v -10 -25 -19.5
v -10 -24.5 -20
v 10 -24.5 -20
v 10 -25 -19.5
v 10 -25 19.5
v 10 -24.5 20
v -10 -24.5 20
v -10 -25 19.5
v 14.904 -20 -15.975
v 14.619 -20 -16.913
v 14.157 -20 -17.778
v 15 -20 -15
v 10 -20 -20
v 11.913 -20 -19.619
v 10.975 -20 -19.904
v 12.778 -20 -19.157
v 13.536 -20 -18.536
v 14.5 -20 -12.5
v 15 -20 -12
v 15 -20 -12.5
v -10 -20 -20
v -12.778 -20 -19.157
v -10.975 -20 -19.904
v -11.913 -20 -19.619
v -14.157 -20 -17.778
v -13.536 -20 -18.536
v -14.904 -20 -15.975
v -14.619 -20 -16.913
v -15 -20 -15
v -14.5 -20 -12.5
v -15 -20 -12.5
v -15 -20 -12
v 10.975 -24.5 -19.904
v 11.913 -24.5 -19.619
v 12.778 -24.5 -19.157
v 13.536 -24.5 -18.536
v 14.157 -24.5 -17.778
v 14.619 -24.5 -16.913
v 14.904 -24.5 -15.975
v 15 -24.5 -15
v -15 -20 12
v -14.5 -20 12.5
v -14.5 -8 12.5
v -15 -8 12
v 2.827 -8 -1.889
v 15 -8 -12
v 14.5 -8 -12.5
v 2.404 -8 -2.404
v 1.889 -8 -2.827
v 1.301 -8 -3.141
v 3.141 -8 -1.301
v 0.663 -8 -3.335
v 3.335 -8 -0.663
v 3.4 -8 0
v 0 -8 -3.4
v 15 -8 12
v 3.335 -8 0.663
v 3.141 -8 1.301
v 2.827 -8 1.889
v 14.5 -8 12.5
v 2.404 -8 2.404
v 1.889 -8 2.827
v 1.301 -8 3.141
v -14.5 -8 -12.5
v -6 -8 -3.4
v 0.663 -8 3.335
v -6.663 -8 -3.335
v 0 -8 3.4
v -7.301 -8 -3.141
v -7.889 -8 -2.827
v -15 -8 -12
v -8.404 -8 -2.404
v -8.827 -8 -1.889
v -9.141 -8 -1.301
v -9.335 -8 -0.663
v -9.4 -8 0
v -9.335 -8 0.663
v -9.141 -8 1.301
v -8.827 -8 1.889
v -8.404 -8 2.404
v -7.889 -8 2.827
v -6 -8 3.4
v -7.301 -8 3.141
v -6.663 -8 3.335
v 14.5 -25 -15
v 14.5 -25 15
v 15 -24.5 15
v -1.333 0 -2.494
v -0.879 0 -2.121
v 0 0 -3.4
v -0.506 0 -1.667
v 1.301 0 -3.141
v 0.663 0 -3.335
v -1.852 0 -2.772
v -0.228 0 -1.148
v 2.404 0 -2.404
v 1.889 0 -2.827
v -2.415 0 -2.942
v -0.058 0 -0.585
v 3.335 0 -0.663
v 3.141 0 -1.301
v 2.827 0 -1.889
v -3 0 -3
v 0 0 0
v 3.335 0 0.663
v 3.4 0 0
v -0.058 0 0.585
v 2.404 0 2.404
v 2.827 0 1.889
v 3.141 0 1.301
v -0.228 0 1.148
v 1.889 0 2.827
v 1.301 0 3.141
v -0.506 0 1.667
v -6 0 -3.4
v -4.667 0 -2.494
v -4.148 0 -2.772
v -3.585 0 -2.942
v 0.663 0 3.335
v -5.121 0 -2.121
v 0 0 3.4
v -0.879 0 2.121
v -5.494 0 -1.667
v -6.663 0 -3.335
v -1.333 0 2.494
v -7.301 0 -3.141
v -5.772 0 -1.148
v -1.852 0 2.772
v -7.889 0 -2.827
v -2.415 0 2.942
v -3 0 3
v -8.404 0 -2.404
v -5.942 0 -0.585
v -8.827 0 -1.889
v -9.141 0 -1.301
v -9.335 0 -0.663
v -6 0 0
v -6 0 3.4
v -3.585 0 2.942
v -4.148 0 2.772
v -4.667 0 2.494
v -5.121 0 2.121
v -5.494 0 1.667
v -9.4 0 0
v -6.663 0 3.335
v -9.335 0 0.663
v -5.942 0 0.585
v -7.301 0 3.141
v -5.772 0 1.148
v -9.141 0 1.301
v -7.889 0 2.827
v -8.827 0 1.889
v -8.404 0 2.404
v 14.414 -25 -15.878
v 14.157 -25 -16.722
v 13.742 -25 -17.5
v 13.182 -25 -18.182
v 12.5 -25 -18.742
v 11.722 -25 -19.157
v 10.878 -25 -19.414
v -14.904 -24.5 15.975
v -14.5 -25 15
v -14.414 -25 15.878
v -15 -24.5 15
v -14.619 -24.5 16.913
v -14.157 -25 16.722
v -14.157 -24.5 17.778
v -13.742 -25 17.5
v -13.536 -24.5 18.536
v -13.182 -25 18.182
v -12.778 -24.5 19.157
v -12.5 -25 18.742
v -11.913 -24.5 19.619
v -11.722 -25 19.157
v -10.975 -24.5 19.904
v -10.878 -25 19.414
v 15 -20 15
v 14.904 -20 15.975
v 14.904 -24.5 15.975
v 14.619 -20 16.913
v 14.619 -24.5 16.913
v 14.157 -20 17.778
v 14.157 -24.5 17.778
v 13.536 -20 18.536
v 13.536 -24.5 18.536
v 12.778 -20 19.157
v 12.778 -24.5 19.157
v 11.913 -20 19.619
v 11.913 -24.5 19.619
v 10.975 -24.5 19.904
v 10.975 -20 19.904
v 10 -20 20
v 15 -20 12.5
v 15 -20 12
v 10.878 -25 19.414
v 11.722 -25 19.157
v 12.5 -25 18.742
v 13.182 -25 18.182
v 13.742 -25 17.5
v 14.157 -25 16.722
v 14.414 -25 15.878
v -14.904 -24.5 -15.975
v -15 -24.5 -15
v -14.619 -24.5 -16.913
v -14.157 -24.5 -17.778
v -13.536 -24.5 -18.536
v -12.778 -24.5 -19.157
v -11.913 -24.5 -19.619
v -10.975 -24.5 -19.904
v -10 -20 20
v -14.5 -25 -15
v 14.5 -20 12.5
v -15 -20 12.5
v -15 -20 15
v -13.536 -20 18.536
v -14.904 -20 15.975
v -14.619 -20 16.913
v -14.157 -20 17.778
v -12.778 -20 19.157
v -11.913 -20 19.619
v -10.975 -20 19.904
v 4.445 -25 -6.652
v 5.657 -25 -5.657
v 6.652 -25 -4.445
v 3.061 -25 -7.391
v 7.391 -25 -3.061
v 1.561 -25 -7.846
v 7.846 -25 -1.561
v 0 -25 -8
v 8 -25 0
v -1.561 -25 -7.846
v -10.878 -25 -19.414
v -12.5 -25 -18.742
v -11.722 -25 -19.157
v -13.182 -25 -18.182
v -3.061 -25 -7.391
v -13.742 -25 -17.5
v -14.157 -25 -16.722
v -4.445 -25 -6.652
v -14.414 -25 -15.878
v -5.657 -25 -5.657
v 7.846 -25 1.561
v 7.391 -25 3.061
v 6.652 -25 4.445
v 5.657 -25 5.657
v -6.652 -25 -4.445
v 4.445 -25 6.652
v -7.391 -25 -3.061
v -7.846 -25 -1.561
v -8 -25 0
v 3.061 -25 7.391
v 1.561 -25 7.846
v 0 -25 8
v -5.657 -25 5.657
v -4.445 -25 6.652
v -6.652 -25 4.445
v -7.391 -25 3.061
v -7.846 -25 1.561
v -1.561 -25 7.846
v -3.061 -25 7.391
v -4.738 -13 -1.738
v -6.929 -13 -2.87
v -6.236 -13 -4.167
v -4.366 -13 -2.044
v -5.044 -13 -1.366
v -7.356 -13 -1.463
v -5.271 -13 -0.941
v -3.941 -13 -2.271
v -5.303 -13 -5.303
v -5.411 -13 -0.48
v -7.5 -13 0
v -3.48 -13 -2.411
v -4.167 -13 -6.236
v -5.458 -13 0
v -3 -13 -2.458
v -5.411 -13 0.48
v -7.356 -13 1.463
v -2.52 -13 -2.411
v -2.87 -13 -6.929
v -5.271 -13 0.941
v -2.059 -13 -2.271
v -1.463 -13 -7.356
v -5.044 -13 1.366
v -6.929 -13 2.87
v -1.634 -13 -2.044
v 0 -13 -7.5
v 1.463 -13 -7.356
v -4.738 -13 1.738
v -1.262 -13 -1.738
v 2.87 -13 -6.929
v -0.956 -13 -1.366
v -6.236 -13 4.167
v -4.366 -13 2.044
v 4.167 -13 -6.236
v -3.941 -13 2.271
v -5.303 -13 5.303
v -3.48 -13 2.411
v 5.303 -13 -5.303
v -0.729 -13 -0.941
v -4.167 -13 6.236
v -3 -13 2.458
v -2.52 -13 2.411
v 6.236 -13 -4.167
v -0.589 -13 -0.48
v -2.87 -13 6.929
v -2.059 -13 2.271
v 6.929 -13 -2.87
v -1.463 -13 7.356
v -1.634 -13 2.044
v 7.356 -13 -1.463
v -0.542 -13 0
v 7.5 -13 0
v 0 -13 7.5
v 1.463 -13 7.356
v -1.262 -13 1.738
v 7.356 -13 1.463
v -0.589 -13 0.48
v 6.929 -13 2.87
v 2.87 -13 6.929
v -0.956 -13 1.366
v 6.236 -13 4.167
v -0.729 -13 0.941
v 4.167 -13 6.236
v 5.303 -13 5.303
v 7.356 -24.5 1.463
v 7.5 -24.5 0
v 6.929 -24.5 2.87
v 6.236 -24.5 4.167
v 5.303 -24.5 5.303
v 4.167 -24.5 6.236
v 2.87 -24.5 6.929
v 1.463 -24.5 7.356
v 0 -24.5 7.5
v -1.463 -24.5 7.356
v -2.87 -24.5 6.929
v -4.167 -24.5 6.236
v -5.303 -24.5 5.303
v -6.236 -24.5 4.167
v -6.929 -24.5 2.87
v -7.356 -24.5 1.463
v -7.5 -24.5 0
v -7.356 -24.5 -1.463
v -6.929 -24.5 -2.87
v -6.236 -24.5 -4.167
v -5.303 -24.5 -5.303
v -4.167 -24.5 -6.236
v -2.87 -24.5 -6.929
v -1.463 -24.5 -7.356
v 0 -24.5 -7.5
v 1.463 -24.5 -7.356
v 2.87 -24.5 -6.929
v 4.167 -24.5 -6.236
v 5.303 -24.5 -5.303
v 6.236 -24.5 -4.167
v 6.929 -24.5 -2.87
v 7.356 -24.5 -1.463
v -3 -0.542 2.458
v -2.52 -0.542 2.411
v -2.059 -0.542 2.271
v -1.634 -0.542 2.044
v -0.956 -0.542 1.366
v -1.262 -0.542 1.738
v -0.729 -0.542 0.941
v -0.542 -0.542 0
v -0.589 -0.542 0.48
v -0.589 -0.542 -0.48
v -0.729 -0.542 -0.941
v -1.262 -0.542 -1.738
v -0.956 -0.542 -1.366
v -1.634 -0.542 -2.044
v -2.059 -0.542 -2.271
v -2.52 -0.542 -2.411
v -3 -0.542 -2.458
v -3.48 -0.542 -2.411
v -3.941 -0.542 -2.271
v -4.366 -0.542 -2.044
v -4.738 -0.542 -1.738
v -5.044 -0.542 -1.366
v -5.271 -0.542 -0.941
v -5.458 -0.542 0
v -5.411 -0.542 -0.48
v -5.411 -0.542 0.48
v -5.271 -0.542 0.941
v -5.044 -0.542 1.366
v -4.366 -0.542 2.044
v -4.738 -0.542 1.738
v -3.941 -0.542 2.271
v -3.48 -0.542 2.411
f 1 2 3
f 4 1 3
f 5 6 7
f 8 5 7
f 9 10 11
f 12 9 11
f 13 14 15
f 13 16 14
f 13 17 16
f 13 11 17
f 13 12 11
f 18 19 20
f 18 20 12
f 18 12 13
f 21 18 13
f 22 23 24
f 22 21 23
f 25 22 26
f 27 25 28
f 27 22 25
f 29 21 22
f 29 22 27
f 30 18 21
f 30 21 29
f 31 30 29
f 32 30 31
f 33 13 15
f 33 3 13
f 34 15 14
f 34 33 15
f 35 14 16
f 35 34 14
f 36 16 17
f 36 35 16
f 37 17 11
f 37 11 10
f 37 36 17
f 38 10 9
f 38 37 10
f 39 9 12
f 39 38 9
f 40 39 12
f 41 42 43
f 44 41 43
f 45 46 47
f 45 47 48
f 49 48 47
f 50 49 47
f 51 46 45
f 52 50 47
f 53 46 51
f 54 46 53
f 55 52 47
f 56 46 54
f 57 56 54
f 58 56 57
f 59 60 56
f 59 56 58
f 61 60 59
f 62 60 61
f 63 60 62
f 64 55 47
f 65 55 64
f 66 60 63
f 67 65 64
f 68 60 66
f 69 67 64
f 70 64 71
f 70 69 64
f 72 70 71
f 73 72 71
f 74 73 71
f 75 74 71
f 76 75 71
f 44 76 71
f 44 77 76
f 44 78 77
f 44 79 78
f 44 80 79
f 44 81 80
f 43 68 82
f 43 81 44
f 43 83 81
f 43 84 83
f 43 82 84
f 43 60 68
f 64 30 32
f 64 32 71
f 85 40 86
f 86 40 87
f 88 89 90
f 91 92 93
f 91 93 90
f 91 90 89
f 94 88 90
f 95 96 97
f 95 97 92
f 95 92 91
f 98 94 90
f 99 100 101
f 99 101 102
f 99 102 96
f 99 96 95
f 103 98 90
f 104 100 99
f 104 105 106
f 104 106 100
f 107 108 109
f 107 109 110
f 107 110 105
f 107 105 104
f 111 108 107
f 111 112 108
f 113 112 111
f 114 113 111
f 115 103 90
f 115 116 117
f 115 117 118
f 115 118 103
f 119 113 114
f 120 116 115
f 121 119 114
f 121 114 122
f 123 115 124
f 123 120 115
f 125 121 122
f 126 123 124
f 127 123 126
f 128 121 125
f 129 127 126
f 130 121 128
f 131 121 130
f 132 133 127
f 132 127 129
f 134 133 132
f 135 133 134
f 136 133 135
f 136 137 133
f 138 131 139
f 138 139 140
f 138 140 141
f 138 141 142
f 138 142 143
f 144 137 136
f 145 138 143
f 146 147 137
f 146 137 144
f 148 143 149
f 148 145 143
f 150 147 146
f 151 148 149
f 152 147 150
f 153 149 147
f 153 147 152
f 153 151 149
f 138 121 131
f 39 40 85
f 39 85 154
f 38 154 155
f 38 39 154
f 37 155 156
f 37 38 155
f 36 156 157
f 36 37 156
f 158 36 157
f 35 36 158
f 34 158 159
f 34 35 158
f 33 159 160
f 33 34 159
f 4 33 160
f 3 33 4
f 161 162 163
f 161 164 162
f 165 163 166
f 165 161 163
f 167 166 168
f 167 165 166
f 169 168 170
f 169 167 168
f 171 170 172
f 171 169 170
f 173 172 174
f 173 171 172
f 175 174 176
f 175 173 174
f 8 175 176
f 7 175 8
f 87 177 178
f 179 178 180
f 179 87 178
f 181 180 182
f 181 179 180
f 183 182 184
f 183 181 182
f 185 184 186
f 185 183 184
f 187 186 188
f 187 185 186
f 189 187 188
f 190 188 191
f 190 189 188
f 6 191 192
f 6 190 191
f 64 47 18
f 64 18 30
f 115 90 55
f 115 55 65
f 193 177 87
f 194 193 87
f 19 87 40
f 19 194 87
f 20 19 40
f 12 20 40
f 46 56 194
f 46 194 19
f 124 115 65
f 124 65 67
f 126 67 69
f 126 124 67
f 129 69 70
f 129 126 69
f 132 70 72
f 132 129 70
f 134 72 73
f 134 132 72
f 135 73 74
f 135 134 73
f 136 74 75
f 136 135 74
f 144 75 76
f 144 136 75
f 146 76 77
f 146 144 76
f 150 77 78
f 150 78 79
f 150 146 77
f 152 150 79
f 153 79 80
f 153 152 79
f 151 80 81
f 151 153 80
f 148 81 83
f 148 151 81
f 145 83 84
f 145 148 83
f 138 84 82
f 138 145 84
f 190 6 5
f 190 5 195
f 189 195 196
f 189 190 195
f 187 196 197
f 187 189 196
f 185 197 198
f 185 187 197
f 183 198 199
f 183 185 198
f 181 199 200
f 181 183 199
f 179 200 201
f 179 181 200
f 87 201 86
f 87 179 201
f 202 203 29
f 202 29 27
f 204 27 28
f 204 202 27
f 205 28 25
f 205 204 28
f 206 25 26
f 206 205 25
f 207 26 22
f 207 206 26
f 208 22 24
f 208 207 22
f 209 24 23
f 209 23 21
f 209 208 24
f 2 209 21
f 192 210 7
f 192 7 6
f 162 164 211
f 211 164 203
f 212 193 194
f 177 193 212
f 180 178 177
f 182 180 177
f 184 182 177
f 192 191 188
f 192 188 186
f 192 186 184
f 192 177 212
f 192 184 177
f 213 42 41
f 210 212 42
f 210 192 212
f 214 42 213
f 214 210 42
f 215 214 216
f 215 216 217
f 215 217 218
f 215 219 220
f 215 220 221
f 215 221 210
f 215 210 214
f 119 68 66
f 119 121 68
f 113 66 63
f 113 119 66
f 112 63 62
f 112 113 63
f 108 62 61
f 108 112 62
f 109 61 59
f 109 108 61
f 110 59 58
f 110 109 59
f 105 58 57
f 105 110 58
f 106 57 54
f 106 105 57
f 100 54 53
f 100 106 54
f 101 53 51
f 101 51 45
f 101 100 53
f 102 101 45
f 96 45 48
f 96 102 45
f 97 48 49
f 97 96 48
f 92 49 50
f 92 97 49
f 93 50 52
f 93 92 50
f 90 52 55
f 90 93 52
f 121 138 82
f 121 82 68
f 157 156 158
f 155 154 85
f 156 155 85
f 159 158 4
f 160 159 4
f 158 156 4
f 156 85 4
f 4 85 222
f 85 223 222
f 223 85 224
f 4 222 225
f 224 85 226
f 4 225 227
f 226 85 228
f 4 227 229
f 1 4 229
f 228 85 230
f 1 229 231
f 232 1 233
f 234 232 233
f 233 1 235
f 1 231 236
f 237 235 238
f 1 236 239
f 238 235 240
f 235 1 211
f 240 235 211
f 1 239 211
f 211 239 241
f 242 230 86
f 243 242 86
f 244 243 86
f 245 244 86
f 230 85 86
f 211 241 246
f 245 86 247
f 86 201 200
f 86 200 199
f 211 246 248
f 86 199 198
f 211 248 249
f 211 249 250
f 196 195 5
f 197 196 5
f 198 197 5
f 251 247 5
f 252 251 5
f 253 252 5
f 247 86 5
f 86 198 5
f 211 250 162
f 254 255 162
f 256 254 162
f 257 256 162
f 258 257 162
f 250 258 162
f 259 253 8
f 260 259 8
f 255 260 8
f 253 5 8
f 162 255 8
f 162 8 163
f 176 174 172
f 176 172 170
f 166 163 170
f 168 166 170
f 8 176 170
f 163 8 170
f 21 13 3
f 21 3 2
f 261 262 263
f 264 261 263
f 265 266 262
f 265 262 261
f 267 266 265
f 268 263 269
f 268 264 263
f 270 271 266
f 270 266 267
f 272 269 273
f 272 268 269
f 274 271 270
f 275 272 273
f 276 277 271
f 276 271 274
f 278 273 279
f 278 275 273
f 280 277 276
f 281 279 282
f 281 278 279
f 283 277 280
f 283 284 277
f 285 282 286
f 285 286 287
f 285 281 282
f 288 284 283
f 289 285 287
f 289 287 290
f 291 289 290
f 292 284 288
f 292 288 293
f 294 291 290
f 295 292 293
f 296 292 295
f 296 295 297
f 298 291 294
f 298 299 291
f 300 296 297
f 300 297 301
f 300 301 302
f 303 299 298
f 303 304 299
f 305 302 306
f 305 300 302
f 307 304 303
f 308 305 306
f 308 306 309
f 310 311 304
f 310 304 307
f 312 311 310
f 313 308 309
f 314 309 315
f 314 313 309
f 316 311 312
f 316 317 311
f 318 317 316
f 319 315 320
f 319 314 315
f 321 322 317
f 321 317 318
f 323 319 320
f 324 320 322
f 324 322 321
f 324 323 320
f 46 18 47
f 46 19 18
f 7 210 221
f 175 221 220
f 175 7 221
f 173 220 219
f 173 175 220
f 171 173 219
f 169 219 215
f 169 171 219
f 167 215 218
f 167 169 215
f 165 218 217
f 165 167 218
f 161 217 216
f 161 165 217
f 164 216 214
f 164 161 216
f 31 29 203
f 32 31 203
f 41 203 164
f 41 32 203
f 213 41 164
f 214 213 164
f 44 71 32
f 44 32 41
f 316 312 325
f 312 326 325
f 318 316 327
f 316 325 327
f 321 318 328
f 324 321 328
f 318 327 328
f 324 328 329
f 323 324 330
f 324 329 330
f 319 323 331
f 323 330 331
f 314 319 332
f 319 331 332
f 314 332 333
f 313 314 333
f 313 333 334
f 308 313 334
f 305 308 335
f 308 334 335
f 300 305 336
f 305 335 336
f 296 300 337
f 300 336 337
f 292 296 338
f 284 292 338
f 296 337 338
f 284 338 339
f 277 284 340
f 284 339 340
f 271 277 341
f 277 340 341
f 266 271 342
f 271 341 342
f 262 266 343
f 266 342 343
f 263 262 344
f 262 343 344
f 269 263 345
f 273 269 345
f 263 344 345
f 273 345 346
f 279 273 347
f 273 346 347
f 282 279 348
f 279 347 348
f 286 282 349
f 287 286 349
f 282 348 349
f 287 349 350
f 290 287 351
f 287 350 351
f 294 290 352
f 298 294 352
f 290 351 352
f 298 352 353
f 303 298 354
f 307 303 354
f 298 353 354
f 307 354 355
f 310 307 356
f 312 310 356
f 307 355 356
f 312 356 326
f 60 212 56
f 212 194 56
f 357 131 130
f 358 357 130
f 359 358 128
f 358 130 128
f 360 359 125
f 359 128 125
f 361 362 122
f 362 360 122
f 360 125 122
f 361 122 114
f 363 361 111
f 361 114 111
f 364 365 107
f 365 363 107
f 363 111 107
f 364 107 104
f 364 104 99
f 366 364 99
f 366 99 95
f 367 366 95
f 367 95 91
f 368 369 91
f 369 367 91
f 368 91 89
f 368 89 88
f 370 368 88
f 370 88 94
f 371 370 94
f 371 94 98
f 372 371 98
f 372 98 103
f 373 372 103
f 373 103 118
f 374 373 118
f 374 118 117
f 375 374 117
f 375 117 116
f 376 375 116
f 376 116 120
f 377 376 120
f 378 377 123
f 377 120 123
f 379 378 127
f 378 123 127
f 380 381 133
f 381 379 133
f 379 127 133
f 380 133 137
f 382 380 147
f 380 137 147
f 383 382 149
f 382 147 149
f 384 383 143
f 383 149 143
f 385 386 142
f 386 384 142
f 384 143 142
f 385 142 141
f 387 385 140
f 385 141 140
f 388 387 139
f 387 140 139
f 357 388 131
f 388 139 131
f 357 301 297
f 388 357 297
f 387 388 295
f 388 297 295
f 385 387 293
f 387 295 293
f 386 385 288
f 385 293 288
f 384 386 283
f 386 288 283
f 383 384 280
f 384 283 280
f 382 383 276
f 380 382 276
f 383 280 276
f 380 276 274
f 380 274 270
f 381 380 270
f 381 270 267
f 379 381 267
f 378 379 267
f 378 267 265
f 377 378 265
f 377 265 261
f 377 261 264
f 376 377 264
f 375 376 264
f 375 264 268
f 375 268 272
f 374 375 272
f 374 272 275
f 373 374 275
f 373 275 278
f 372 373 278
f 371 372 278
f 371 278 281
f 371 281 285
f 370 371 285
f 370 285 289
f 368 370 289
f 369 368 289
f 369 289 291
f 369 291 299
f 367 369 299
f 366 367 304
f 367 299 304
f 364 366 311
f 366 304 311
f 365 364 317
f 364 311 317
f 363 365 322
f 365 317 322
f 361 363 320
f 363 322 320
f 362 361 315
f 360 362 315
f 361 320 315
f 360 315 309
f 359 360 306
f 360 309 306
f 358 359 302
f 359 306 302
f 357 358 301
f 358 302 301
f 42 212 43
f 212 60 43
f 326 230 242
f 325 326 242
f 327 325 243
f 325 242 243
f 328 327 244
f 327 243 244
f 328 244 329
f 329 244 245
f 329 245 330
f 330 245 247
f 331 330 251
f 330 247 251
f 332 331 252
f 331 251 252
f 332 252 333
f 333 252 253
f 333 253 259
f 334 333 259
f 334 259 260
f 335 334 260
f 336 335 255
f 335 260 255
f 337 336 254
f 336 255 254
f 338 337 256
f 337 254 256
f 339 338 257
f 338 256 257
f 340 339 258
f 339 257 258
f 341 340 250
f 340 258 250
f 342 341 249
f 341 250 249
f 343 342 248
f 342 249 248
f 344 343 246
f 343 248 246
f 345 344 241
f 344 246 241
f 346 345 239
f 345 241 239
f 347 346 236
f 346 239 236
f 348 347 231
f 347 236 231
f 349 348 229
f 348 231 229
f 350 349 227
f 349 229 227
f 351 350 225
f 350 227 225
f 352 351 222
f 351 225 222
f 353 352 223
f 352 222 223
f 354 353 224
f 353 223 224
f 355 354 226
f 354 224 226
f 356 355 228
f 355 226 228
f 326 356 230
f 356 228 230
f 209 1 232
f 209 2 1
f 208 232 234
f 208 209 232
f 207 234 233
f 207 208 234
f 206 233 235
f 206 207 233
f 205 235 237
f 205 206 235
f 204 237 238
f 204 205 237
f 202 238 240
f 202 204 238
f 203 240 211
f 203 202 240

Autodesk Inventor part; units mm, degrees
ref_plane "YZ Plane" through (0, 0, 0) normal (1, 0, 0) x (0, 1, 0)
ref_plane "XZ Plane" through (0, 0, 0) normal (0, 1, 0) x (-1, 0, 0)
ref_plane "XY Plane" through (0, 0, 0) normal (0, 0, 1) x (1, 0, 0)
sketch "Sketch1" plane through (0, 0, 0) normal (0, 1, 0) x (-1, 0, 0)
  line L0 (15, 20) -> (-15, 20)
  line L1 (-15, 20) -> (-15, -20)
  line L2 (-15, -20) -> (15, -20)
  line L3 (15, -20) -> (15, 20)
  line L4 (15, 20) -> (-15, -20) construction
  line L5 (-15, 20) -> (15, -20) construction
  line L6 (21, 0) -> (-21, 0) construction
  line L7 (0, -28) -> (0, 28) construction
  line L8 (6, 0) -> (0, 0) construction
  line L9 (6, 3.4) -> (0, 3.4)
  line L10 (0, -3.4) -> (6, -3.4)
  arc A0 (6, -3.4) -> (6, 3.4) centre (6, 0) ccw
  arc A1 (0, 3.4) -> (0, -3.4) centre (0, 0) ccw
  line L11 (-15, 12.5) -> (15, 12.5)
  line L12 (-15, -12.5) -> (15, -12.5)
  point P0 (0, 0)
  point P1 (3, 0)
  point P2 (3, 0)
  point P3 (15, -12.5)
  dimension "d0" = 40
  dimension "d1" = 30
  dimension "d2" = 6
  dimension "d3" = 6.8
  dimension "d19" = 3
  dimension "d35" = 25
extrude "Extrusion1" add sketch "Sketch1" against normal blind 25 contours L3 L11 L1 L0 | L3 L12 L1 L11 | L3 L2 L1 L12 | A0 L10 A1 L9
extrude "Extrusion2" cut sketch "Sketch1" against normal blind 8
sketch "Sketch3" plane through (0, -25, 0) normal (0, -1, 0) x (1, 0, 0)
  circle A0 centre (0, 0) radius 7.5
  dimension "d29" = 15
extrude "Extrusion5" cut sketch "Sketch3" against normal blind 12
extrude "Extrusion6" cut sketch "Sketch1" against normal blind 20 contours L3 L11 L1 L0 | L3 L2 L1 L12
hole "Hole1" at (-3, 0, 0) direction (0, -1, 0) diameter 4.917 depth 13 countersink diameter 6 countersink angle 90 thread size "M6x1" class "6H" standard "ISO Metric profile"
fillet "Fillet1" radius 5 4 edges at (-15, -22.5, 20) (-15, -22.5, -20) (15, -22.5, -20) (15, -22.5, 20)
chamfer "Chamfer1" distance 0.5 angle 45 13 edges at (0, -25, 20) (-13.5355, -25, 18.5355) (-15, -25, 0) (-13.5355, -25, -18.5355) (0, -25, -20) (13.5355, -25, -18.5355) (15, -25, 0) (13.5355, -25, 18.5355) (-7.5, -25, 0) (-15, -14, 12.5) (-15, -14, -12.5) (15, -14, -12.5) (15, -14, 12.5)
equation "\"d4\" = slotTabH + sheetT"
equation "\"d6\" = slotTabH"
equation "\"slotTabH\" = 8"
equation "\"sheetT\" = 17"
equation "\"totalHeight\" = slotTabH + sheetT"
properties part number "TCSM1-X-003" material "Steel"
